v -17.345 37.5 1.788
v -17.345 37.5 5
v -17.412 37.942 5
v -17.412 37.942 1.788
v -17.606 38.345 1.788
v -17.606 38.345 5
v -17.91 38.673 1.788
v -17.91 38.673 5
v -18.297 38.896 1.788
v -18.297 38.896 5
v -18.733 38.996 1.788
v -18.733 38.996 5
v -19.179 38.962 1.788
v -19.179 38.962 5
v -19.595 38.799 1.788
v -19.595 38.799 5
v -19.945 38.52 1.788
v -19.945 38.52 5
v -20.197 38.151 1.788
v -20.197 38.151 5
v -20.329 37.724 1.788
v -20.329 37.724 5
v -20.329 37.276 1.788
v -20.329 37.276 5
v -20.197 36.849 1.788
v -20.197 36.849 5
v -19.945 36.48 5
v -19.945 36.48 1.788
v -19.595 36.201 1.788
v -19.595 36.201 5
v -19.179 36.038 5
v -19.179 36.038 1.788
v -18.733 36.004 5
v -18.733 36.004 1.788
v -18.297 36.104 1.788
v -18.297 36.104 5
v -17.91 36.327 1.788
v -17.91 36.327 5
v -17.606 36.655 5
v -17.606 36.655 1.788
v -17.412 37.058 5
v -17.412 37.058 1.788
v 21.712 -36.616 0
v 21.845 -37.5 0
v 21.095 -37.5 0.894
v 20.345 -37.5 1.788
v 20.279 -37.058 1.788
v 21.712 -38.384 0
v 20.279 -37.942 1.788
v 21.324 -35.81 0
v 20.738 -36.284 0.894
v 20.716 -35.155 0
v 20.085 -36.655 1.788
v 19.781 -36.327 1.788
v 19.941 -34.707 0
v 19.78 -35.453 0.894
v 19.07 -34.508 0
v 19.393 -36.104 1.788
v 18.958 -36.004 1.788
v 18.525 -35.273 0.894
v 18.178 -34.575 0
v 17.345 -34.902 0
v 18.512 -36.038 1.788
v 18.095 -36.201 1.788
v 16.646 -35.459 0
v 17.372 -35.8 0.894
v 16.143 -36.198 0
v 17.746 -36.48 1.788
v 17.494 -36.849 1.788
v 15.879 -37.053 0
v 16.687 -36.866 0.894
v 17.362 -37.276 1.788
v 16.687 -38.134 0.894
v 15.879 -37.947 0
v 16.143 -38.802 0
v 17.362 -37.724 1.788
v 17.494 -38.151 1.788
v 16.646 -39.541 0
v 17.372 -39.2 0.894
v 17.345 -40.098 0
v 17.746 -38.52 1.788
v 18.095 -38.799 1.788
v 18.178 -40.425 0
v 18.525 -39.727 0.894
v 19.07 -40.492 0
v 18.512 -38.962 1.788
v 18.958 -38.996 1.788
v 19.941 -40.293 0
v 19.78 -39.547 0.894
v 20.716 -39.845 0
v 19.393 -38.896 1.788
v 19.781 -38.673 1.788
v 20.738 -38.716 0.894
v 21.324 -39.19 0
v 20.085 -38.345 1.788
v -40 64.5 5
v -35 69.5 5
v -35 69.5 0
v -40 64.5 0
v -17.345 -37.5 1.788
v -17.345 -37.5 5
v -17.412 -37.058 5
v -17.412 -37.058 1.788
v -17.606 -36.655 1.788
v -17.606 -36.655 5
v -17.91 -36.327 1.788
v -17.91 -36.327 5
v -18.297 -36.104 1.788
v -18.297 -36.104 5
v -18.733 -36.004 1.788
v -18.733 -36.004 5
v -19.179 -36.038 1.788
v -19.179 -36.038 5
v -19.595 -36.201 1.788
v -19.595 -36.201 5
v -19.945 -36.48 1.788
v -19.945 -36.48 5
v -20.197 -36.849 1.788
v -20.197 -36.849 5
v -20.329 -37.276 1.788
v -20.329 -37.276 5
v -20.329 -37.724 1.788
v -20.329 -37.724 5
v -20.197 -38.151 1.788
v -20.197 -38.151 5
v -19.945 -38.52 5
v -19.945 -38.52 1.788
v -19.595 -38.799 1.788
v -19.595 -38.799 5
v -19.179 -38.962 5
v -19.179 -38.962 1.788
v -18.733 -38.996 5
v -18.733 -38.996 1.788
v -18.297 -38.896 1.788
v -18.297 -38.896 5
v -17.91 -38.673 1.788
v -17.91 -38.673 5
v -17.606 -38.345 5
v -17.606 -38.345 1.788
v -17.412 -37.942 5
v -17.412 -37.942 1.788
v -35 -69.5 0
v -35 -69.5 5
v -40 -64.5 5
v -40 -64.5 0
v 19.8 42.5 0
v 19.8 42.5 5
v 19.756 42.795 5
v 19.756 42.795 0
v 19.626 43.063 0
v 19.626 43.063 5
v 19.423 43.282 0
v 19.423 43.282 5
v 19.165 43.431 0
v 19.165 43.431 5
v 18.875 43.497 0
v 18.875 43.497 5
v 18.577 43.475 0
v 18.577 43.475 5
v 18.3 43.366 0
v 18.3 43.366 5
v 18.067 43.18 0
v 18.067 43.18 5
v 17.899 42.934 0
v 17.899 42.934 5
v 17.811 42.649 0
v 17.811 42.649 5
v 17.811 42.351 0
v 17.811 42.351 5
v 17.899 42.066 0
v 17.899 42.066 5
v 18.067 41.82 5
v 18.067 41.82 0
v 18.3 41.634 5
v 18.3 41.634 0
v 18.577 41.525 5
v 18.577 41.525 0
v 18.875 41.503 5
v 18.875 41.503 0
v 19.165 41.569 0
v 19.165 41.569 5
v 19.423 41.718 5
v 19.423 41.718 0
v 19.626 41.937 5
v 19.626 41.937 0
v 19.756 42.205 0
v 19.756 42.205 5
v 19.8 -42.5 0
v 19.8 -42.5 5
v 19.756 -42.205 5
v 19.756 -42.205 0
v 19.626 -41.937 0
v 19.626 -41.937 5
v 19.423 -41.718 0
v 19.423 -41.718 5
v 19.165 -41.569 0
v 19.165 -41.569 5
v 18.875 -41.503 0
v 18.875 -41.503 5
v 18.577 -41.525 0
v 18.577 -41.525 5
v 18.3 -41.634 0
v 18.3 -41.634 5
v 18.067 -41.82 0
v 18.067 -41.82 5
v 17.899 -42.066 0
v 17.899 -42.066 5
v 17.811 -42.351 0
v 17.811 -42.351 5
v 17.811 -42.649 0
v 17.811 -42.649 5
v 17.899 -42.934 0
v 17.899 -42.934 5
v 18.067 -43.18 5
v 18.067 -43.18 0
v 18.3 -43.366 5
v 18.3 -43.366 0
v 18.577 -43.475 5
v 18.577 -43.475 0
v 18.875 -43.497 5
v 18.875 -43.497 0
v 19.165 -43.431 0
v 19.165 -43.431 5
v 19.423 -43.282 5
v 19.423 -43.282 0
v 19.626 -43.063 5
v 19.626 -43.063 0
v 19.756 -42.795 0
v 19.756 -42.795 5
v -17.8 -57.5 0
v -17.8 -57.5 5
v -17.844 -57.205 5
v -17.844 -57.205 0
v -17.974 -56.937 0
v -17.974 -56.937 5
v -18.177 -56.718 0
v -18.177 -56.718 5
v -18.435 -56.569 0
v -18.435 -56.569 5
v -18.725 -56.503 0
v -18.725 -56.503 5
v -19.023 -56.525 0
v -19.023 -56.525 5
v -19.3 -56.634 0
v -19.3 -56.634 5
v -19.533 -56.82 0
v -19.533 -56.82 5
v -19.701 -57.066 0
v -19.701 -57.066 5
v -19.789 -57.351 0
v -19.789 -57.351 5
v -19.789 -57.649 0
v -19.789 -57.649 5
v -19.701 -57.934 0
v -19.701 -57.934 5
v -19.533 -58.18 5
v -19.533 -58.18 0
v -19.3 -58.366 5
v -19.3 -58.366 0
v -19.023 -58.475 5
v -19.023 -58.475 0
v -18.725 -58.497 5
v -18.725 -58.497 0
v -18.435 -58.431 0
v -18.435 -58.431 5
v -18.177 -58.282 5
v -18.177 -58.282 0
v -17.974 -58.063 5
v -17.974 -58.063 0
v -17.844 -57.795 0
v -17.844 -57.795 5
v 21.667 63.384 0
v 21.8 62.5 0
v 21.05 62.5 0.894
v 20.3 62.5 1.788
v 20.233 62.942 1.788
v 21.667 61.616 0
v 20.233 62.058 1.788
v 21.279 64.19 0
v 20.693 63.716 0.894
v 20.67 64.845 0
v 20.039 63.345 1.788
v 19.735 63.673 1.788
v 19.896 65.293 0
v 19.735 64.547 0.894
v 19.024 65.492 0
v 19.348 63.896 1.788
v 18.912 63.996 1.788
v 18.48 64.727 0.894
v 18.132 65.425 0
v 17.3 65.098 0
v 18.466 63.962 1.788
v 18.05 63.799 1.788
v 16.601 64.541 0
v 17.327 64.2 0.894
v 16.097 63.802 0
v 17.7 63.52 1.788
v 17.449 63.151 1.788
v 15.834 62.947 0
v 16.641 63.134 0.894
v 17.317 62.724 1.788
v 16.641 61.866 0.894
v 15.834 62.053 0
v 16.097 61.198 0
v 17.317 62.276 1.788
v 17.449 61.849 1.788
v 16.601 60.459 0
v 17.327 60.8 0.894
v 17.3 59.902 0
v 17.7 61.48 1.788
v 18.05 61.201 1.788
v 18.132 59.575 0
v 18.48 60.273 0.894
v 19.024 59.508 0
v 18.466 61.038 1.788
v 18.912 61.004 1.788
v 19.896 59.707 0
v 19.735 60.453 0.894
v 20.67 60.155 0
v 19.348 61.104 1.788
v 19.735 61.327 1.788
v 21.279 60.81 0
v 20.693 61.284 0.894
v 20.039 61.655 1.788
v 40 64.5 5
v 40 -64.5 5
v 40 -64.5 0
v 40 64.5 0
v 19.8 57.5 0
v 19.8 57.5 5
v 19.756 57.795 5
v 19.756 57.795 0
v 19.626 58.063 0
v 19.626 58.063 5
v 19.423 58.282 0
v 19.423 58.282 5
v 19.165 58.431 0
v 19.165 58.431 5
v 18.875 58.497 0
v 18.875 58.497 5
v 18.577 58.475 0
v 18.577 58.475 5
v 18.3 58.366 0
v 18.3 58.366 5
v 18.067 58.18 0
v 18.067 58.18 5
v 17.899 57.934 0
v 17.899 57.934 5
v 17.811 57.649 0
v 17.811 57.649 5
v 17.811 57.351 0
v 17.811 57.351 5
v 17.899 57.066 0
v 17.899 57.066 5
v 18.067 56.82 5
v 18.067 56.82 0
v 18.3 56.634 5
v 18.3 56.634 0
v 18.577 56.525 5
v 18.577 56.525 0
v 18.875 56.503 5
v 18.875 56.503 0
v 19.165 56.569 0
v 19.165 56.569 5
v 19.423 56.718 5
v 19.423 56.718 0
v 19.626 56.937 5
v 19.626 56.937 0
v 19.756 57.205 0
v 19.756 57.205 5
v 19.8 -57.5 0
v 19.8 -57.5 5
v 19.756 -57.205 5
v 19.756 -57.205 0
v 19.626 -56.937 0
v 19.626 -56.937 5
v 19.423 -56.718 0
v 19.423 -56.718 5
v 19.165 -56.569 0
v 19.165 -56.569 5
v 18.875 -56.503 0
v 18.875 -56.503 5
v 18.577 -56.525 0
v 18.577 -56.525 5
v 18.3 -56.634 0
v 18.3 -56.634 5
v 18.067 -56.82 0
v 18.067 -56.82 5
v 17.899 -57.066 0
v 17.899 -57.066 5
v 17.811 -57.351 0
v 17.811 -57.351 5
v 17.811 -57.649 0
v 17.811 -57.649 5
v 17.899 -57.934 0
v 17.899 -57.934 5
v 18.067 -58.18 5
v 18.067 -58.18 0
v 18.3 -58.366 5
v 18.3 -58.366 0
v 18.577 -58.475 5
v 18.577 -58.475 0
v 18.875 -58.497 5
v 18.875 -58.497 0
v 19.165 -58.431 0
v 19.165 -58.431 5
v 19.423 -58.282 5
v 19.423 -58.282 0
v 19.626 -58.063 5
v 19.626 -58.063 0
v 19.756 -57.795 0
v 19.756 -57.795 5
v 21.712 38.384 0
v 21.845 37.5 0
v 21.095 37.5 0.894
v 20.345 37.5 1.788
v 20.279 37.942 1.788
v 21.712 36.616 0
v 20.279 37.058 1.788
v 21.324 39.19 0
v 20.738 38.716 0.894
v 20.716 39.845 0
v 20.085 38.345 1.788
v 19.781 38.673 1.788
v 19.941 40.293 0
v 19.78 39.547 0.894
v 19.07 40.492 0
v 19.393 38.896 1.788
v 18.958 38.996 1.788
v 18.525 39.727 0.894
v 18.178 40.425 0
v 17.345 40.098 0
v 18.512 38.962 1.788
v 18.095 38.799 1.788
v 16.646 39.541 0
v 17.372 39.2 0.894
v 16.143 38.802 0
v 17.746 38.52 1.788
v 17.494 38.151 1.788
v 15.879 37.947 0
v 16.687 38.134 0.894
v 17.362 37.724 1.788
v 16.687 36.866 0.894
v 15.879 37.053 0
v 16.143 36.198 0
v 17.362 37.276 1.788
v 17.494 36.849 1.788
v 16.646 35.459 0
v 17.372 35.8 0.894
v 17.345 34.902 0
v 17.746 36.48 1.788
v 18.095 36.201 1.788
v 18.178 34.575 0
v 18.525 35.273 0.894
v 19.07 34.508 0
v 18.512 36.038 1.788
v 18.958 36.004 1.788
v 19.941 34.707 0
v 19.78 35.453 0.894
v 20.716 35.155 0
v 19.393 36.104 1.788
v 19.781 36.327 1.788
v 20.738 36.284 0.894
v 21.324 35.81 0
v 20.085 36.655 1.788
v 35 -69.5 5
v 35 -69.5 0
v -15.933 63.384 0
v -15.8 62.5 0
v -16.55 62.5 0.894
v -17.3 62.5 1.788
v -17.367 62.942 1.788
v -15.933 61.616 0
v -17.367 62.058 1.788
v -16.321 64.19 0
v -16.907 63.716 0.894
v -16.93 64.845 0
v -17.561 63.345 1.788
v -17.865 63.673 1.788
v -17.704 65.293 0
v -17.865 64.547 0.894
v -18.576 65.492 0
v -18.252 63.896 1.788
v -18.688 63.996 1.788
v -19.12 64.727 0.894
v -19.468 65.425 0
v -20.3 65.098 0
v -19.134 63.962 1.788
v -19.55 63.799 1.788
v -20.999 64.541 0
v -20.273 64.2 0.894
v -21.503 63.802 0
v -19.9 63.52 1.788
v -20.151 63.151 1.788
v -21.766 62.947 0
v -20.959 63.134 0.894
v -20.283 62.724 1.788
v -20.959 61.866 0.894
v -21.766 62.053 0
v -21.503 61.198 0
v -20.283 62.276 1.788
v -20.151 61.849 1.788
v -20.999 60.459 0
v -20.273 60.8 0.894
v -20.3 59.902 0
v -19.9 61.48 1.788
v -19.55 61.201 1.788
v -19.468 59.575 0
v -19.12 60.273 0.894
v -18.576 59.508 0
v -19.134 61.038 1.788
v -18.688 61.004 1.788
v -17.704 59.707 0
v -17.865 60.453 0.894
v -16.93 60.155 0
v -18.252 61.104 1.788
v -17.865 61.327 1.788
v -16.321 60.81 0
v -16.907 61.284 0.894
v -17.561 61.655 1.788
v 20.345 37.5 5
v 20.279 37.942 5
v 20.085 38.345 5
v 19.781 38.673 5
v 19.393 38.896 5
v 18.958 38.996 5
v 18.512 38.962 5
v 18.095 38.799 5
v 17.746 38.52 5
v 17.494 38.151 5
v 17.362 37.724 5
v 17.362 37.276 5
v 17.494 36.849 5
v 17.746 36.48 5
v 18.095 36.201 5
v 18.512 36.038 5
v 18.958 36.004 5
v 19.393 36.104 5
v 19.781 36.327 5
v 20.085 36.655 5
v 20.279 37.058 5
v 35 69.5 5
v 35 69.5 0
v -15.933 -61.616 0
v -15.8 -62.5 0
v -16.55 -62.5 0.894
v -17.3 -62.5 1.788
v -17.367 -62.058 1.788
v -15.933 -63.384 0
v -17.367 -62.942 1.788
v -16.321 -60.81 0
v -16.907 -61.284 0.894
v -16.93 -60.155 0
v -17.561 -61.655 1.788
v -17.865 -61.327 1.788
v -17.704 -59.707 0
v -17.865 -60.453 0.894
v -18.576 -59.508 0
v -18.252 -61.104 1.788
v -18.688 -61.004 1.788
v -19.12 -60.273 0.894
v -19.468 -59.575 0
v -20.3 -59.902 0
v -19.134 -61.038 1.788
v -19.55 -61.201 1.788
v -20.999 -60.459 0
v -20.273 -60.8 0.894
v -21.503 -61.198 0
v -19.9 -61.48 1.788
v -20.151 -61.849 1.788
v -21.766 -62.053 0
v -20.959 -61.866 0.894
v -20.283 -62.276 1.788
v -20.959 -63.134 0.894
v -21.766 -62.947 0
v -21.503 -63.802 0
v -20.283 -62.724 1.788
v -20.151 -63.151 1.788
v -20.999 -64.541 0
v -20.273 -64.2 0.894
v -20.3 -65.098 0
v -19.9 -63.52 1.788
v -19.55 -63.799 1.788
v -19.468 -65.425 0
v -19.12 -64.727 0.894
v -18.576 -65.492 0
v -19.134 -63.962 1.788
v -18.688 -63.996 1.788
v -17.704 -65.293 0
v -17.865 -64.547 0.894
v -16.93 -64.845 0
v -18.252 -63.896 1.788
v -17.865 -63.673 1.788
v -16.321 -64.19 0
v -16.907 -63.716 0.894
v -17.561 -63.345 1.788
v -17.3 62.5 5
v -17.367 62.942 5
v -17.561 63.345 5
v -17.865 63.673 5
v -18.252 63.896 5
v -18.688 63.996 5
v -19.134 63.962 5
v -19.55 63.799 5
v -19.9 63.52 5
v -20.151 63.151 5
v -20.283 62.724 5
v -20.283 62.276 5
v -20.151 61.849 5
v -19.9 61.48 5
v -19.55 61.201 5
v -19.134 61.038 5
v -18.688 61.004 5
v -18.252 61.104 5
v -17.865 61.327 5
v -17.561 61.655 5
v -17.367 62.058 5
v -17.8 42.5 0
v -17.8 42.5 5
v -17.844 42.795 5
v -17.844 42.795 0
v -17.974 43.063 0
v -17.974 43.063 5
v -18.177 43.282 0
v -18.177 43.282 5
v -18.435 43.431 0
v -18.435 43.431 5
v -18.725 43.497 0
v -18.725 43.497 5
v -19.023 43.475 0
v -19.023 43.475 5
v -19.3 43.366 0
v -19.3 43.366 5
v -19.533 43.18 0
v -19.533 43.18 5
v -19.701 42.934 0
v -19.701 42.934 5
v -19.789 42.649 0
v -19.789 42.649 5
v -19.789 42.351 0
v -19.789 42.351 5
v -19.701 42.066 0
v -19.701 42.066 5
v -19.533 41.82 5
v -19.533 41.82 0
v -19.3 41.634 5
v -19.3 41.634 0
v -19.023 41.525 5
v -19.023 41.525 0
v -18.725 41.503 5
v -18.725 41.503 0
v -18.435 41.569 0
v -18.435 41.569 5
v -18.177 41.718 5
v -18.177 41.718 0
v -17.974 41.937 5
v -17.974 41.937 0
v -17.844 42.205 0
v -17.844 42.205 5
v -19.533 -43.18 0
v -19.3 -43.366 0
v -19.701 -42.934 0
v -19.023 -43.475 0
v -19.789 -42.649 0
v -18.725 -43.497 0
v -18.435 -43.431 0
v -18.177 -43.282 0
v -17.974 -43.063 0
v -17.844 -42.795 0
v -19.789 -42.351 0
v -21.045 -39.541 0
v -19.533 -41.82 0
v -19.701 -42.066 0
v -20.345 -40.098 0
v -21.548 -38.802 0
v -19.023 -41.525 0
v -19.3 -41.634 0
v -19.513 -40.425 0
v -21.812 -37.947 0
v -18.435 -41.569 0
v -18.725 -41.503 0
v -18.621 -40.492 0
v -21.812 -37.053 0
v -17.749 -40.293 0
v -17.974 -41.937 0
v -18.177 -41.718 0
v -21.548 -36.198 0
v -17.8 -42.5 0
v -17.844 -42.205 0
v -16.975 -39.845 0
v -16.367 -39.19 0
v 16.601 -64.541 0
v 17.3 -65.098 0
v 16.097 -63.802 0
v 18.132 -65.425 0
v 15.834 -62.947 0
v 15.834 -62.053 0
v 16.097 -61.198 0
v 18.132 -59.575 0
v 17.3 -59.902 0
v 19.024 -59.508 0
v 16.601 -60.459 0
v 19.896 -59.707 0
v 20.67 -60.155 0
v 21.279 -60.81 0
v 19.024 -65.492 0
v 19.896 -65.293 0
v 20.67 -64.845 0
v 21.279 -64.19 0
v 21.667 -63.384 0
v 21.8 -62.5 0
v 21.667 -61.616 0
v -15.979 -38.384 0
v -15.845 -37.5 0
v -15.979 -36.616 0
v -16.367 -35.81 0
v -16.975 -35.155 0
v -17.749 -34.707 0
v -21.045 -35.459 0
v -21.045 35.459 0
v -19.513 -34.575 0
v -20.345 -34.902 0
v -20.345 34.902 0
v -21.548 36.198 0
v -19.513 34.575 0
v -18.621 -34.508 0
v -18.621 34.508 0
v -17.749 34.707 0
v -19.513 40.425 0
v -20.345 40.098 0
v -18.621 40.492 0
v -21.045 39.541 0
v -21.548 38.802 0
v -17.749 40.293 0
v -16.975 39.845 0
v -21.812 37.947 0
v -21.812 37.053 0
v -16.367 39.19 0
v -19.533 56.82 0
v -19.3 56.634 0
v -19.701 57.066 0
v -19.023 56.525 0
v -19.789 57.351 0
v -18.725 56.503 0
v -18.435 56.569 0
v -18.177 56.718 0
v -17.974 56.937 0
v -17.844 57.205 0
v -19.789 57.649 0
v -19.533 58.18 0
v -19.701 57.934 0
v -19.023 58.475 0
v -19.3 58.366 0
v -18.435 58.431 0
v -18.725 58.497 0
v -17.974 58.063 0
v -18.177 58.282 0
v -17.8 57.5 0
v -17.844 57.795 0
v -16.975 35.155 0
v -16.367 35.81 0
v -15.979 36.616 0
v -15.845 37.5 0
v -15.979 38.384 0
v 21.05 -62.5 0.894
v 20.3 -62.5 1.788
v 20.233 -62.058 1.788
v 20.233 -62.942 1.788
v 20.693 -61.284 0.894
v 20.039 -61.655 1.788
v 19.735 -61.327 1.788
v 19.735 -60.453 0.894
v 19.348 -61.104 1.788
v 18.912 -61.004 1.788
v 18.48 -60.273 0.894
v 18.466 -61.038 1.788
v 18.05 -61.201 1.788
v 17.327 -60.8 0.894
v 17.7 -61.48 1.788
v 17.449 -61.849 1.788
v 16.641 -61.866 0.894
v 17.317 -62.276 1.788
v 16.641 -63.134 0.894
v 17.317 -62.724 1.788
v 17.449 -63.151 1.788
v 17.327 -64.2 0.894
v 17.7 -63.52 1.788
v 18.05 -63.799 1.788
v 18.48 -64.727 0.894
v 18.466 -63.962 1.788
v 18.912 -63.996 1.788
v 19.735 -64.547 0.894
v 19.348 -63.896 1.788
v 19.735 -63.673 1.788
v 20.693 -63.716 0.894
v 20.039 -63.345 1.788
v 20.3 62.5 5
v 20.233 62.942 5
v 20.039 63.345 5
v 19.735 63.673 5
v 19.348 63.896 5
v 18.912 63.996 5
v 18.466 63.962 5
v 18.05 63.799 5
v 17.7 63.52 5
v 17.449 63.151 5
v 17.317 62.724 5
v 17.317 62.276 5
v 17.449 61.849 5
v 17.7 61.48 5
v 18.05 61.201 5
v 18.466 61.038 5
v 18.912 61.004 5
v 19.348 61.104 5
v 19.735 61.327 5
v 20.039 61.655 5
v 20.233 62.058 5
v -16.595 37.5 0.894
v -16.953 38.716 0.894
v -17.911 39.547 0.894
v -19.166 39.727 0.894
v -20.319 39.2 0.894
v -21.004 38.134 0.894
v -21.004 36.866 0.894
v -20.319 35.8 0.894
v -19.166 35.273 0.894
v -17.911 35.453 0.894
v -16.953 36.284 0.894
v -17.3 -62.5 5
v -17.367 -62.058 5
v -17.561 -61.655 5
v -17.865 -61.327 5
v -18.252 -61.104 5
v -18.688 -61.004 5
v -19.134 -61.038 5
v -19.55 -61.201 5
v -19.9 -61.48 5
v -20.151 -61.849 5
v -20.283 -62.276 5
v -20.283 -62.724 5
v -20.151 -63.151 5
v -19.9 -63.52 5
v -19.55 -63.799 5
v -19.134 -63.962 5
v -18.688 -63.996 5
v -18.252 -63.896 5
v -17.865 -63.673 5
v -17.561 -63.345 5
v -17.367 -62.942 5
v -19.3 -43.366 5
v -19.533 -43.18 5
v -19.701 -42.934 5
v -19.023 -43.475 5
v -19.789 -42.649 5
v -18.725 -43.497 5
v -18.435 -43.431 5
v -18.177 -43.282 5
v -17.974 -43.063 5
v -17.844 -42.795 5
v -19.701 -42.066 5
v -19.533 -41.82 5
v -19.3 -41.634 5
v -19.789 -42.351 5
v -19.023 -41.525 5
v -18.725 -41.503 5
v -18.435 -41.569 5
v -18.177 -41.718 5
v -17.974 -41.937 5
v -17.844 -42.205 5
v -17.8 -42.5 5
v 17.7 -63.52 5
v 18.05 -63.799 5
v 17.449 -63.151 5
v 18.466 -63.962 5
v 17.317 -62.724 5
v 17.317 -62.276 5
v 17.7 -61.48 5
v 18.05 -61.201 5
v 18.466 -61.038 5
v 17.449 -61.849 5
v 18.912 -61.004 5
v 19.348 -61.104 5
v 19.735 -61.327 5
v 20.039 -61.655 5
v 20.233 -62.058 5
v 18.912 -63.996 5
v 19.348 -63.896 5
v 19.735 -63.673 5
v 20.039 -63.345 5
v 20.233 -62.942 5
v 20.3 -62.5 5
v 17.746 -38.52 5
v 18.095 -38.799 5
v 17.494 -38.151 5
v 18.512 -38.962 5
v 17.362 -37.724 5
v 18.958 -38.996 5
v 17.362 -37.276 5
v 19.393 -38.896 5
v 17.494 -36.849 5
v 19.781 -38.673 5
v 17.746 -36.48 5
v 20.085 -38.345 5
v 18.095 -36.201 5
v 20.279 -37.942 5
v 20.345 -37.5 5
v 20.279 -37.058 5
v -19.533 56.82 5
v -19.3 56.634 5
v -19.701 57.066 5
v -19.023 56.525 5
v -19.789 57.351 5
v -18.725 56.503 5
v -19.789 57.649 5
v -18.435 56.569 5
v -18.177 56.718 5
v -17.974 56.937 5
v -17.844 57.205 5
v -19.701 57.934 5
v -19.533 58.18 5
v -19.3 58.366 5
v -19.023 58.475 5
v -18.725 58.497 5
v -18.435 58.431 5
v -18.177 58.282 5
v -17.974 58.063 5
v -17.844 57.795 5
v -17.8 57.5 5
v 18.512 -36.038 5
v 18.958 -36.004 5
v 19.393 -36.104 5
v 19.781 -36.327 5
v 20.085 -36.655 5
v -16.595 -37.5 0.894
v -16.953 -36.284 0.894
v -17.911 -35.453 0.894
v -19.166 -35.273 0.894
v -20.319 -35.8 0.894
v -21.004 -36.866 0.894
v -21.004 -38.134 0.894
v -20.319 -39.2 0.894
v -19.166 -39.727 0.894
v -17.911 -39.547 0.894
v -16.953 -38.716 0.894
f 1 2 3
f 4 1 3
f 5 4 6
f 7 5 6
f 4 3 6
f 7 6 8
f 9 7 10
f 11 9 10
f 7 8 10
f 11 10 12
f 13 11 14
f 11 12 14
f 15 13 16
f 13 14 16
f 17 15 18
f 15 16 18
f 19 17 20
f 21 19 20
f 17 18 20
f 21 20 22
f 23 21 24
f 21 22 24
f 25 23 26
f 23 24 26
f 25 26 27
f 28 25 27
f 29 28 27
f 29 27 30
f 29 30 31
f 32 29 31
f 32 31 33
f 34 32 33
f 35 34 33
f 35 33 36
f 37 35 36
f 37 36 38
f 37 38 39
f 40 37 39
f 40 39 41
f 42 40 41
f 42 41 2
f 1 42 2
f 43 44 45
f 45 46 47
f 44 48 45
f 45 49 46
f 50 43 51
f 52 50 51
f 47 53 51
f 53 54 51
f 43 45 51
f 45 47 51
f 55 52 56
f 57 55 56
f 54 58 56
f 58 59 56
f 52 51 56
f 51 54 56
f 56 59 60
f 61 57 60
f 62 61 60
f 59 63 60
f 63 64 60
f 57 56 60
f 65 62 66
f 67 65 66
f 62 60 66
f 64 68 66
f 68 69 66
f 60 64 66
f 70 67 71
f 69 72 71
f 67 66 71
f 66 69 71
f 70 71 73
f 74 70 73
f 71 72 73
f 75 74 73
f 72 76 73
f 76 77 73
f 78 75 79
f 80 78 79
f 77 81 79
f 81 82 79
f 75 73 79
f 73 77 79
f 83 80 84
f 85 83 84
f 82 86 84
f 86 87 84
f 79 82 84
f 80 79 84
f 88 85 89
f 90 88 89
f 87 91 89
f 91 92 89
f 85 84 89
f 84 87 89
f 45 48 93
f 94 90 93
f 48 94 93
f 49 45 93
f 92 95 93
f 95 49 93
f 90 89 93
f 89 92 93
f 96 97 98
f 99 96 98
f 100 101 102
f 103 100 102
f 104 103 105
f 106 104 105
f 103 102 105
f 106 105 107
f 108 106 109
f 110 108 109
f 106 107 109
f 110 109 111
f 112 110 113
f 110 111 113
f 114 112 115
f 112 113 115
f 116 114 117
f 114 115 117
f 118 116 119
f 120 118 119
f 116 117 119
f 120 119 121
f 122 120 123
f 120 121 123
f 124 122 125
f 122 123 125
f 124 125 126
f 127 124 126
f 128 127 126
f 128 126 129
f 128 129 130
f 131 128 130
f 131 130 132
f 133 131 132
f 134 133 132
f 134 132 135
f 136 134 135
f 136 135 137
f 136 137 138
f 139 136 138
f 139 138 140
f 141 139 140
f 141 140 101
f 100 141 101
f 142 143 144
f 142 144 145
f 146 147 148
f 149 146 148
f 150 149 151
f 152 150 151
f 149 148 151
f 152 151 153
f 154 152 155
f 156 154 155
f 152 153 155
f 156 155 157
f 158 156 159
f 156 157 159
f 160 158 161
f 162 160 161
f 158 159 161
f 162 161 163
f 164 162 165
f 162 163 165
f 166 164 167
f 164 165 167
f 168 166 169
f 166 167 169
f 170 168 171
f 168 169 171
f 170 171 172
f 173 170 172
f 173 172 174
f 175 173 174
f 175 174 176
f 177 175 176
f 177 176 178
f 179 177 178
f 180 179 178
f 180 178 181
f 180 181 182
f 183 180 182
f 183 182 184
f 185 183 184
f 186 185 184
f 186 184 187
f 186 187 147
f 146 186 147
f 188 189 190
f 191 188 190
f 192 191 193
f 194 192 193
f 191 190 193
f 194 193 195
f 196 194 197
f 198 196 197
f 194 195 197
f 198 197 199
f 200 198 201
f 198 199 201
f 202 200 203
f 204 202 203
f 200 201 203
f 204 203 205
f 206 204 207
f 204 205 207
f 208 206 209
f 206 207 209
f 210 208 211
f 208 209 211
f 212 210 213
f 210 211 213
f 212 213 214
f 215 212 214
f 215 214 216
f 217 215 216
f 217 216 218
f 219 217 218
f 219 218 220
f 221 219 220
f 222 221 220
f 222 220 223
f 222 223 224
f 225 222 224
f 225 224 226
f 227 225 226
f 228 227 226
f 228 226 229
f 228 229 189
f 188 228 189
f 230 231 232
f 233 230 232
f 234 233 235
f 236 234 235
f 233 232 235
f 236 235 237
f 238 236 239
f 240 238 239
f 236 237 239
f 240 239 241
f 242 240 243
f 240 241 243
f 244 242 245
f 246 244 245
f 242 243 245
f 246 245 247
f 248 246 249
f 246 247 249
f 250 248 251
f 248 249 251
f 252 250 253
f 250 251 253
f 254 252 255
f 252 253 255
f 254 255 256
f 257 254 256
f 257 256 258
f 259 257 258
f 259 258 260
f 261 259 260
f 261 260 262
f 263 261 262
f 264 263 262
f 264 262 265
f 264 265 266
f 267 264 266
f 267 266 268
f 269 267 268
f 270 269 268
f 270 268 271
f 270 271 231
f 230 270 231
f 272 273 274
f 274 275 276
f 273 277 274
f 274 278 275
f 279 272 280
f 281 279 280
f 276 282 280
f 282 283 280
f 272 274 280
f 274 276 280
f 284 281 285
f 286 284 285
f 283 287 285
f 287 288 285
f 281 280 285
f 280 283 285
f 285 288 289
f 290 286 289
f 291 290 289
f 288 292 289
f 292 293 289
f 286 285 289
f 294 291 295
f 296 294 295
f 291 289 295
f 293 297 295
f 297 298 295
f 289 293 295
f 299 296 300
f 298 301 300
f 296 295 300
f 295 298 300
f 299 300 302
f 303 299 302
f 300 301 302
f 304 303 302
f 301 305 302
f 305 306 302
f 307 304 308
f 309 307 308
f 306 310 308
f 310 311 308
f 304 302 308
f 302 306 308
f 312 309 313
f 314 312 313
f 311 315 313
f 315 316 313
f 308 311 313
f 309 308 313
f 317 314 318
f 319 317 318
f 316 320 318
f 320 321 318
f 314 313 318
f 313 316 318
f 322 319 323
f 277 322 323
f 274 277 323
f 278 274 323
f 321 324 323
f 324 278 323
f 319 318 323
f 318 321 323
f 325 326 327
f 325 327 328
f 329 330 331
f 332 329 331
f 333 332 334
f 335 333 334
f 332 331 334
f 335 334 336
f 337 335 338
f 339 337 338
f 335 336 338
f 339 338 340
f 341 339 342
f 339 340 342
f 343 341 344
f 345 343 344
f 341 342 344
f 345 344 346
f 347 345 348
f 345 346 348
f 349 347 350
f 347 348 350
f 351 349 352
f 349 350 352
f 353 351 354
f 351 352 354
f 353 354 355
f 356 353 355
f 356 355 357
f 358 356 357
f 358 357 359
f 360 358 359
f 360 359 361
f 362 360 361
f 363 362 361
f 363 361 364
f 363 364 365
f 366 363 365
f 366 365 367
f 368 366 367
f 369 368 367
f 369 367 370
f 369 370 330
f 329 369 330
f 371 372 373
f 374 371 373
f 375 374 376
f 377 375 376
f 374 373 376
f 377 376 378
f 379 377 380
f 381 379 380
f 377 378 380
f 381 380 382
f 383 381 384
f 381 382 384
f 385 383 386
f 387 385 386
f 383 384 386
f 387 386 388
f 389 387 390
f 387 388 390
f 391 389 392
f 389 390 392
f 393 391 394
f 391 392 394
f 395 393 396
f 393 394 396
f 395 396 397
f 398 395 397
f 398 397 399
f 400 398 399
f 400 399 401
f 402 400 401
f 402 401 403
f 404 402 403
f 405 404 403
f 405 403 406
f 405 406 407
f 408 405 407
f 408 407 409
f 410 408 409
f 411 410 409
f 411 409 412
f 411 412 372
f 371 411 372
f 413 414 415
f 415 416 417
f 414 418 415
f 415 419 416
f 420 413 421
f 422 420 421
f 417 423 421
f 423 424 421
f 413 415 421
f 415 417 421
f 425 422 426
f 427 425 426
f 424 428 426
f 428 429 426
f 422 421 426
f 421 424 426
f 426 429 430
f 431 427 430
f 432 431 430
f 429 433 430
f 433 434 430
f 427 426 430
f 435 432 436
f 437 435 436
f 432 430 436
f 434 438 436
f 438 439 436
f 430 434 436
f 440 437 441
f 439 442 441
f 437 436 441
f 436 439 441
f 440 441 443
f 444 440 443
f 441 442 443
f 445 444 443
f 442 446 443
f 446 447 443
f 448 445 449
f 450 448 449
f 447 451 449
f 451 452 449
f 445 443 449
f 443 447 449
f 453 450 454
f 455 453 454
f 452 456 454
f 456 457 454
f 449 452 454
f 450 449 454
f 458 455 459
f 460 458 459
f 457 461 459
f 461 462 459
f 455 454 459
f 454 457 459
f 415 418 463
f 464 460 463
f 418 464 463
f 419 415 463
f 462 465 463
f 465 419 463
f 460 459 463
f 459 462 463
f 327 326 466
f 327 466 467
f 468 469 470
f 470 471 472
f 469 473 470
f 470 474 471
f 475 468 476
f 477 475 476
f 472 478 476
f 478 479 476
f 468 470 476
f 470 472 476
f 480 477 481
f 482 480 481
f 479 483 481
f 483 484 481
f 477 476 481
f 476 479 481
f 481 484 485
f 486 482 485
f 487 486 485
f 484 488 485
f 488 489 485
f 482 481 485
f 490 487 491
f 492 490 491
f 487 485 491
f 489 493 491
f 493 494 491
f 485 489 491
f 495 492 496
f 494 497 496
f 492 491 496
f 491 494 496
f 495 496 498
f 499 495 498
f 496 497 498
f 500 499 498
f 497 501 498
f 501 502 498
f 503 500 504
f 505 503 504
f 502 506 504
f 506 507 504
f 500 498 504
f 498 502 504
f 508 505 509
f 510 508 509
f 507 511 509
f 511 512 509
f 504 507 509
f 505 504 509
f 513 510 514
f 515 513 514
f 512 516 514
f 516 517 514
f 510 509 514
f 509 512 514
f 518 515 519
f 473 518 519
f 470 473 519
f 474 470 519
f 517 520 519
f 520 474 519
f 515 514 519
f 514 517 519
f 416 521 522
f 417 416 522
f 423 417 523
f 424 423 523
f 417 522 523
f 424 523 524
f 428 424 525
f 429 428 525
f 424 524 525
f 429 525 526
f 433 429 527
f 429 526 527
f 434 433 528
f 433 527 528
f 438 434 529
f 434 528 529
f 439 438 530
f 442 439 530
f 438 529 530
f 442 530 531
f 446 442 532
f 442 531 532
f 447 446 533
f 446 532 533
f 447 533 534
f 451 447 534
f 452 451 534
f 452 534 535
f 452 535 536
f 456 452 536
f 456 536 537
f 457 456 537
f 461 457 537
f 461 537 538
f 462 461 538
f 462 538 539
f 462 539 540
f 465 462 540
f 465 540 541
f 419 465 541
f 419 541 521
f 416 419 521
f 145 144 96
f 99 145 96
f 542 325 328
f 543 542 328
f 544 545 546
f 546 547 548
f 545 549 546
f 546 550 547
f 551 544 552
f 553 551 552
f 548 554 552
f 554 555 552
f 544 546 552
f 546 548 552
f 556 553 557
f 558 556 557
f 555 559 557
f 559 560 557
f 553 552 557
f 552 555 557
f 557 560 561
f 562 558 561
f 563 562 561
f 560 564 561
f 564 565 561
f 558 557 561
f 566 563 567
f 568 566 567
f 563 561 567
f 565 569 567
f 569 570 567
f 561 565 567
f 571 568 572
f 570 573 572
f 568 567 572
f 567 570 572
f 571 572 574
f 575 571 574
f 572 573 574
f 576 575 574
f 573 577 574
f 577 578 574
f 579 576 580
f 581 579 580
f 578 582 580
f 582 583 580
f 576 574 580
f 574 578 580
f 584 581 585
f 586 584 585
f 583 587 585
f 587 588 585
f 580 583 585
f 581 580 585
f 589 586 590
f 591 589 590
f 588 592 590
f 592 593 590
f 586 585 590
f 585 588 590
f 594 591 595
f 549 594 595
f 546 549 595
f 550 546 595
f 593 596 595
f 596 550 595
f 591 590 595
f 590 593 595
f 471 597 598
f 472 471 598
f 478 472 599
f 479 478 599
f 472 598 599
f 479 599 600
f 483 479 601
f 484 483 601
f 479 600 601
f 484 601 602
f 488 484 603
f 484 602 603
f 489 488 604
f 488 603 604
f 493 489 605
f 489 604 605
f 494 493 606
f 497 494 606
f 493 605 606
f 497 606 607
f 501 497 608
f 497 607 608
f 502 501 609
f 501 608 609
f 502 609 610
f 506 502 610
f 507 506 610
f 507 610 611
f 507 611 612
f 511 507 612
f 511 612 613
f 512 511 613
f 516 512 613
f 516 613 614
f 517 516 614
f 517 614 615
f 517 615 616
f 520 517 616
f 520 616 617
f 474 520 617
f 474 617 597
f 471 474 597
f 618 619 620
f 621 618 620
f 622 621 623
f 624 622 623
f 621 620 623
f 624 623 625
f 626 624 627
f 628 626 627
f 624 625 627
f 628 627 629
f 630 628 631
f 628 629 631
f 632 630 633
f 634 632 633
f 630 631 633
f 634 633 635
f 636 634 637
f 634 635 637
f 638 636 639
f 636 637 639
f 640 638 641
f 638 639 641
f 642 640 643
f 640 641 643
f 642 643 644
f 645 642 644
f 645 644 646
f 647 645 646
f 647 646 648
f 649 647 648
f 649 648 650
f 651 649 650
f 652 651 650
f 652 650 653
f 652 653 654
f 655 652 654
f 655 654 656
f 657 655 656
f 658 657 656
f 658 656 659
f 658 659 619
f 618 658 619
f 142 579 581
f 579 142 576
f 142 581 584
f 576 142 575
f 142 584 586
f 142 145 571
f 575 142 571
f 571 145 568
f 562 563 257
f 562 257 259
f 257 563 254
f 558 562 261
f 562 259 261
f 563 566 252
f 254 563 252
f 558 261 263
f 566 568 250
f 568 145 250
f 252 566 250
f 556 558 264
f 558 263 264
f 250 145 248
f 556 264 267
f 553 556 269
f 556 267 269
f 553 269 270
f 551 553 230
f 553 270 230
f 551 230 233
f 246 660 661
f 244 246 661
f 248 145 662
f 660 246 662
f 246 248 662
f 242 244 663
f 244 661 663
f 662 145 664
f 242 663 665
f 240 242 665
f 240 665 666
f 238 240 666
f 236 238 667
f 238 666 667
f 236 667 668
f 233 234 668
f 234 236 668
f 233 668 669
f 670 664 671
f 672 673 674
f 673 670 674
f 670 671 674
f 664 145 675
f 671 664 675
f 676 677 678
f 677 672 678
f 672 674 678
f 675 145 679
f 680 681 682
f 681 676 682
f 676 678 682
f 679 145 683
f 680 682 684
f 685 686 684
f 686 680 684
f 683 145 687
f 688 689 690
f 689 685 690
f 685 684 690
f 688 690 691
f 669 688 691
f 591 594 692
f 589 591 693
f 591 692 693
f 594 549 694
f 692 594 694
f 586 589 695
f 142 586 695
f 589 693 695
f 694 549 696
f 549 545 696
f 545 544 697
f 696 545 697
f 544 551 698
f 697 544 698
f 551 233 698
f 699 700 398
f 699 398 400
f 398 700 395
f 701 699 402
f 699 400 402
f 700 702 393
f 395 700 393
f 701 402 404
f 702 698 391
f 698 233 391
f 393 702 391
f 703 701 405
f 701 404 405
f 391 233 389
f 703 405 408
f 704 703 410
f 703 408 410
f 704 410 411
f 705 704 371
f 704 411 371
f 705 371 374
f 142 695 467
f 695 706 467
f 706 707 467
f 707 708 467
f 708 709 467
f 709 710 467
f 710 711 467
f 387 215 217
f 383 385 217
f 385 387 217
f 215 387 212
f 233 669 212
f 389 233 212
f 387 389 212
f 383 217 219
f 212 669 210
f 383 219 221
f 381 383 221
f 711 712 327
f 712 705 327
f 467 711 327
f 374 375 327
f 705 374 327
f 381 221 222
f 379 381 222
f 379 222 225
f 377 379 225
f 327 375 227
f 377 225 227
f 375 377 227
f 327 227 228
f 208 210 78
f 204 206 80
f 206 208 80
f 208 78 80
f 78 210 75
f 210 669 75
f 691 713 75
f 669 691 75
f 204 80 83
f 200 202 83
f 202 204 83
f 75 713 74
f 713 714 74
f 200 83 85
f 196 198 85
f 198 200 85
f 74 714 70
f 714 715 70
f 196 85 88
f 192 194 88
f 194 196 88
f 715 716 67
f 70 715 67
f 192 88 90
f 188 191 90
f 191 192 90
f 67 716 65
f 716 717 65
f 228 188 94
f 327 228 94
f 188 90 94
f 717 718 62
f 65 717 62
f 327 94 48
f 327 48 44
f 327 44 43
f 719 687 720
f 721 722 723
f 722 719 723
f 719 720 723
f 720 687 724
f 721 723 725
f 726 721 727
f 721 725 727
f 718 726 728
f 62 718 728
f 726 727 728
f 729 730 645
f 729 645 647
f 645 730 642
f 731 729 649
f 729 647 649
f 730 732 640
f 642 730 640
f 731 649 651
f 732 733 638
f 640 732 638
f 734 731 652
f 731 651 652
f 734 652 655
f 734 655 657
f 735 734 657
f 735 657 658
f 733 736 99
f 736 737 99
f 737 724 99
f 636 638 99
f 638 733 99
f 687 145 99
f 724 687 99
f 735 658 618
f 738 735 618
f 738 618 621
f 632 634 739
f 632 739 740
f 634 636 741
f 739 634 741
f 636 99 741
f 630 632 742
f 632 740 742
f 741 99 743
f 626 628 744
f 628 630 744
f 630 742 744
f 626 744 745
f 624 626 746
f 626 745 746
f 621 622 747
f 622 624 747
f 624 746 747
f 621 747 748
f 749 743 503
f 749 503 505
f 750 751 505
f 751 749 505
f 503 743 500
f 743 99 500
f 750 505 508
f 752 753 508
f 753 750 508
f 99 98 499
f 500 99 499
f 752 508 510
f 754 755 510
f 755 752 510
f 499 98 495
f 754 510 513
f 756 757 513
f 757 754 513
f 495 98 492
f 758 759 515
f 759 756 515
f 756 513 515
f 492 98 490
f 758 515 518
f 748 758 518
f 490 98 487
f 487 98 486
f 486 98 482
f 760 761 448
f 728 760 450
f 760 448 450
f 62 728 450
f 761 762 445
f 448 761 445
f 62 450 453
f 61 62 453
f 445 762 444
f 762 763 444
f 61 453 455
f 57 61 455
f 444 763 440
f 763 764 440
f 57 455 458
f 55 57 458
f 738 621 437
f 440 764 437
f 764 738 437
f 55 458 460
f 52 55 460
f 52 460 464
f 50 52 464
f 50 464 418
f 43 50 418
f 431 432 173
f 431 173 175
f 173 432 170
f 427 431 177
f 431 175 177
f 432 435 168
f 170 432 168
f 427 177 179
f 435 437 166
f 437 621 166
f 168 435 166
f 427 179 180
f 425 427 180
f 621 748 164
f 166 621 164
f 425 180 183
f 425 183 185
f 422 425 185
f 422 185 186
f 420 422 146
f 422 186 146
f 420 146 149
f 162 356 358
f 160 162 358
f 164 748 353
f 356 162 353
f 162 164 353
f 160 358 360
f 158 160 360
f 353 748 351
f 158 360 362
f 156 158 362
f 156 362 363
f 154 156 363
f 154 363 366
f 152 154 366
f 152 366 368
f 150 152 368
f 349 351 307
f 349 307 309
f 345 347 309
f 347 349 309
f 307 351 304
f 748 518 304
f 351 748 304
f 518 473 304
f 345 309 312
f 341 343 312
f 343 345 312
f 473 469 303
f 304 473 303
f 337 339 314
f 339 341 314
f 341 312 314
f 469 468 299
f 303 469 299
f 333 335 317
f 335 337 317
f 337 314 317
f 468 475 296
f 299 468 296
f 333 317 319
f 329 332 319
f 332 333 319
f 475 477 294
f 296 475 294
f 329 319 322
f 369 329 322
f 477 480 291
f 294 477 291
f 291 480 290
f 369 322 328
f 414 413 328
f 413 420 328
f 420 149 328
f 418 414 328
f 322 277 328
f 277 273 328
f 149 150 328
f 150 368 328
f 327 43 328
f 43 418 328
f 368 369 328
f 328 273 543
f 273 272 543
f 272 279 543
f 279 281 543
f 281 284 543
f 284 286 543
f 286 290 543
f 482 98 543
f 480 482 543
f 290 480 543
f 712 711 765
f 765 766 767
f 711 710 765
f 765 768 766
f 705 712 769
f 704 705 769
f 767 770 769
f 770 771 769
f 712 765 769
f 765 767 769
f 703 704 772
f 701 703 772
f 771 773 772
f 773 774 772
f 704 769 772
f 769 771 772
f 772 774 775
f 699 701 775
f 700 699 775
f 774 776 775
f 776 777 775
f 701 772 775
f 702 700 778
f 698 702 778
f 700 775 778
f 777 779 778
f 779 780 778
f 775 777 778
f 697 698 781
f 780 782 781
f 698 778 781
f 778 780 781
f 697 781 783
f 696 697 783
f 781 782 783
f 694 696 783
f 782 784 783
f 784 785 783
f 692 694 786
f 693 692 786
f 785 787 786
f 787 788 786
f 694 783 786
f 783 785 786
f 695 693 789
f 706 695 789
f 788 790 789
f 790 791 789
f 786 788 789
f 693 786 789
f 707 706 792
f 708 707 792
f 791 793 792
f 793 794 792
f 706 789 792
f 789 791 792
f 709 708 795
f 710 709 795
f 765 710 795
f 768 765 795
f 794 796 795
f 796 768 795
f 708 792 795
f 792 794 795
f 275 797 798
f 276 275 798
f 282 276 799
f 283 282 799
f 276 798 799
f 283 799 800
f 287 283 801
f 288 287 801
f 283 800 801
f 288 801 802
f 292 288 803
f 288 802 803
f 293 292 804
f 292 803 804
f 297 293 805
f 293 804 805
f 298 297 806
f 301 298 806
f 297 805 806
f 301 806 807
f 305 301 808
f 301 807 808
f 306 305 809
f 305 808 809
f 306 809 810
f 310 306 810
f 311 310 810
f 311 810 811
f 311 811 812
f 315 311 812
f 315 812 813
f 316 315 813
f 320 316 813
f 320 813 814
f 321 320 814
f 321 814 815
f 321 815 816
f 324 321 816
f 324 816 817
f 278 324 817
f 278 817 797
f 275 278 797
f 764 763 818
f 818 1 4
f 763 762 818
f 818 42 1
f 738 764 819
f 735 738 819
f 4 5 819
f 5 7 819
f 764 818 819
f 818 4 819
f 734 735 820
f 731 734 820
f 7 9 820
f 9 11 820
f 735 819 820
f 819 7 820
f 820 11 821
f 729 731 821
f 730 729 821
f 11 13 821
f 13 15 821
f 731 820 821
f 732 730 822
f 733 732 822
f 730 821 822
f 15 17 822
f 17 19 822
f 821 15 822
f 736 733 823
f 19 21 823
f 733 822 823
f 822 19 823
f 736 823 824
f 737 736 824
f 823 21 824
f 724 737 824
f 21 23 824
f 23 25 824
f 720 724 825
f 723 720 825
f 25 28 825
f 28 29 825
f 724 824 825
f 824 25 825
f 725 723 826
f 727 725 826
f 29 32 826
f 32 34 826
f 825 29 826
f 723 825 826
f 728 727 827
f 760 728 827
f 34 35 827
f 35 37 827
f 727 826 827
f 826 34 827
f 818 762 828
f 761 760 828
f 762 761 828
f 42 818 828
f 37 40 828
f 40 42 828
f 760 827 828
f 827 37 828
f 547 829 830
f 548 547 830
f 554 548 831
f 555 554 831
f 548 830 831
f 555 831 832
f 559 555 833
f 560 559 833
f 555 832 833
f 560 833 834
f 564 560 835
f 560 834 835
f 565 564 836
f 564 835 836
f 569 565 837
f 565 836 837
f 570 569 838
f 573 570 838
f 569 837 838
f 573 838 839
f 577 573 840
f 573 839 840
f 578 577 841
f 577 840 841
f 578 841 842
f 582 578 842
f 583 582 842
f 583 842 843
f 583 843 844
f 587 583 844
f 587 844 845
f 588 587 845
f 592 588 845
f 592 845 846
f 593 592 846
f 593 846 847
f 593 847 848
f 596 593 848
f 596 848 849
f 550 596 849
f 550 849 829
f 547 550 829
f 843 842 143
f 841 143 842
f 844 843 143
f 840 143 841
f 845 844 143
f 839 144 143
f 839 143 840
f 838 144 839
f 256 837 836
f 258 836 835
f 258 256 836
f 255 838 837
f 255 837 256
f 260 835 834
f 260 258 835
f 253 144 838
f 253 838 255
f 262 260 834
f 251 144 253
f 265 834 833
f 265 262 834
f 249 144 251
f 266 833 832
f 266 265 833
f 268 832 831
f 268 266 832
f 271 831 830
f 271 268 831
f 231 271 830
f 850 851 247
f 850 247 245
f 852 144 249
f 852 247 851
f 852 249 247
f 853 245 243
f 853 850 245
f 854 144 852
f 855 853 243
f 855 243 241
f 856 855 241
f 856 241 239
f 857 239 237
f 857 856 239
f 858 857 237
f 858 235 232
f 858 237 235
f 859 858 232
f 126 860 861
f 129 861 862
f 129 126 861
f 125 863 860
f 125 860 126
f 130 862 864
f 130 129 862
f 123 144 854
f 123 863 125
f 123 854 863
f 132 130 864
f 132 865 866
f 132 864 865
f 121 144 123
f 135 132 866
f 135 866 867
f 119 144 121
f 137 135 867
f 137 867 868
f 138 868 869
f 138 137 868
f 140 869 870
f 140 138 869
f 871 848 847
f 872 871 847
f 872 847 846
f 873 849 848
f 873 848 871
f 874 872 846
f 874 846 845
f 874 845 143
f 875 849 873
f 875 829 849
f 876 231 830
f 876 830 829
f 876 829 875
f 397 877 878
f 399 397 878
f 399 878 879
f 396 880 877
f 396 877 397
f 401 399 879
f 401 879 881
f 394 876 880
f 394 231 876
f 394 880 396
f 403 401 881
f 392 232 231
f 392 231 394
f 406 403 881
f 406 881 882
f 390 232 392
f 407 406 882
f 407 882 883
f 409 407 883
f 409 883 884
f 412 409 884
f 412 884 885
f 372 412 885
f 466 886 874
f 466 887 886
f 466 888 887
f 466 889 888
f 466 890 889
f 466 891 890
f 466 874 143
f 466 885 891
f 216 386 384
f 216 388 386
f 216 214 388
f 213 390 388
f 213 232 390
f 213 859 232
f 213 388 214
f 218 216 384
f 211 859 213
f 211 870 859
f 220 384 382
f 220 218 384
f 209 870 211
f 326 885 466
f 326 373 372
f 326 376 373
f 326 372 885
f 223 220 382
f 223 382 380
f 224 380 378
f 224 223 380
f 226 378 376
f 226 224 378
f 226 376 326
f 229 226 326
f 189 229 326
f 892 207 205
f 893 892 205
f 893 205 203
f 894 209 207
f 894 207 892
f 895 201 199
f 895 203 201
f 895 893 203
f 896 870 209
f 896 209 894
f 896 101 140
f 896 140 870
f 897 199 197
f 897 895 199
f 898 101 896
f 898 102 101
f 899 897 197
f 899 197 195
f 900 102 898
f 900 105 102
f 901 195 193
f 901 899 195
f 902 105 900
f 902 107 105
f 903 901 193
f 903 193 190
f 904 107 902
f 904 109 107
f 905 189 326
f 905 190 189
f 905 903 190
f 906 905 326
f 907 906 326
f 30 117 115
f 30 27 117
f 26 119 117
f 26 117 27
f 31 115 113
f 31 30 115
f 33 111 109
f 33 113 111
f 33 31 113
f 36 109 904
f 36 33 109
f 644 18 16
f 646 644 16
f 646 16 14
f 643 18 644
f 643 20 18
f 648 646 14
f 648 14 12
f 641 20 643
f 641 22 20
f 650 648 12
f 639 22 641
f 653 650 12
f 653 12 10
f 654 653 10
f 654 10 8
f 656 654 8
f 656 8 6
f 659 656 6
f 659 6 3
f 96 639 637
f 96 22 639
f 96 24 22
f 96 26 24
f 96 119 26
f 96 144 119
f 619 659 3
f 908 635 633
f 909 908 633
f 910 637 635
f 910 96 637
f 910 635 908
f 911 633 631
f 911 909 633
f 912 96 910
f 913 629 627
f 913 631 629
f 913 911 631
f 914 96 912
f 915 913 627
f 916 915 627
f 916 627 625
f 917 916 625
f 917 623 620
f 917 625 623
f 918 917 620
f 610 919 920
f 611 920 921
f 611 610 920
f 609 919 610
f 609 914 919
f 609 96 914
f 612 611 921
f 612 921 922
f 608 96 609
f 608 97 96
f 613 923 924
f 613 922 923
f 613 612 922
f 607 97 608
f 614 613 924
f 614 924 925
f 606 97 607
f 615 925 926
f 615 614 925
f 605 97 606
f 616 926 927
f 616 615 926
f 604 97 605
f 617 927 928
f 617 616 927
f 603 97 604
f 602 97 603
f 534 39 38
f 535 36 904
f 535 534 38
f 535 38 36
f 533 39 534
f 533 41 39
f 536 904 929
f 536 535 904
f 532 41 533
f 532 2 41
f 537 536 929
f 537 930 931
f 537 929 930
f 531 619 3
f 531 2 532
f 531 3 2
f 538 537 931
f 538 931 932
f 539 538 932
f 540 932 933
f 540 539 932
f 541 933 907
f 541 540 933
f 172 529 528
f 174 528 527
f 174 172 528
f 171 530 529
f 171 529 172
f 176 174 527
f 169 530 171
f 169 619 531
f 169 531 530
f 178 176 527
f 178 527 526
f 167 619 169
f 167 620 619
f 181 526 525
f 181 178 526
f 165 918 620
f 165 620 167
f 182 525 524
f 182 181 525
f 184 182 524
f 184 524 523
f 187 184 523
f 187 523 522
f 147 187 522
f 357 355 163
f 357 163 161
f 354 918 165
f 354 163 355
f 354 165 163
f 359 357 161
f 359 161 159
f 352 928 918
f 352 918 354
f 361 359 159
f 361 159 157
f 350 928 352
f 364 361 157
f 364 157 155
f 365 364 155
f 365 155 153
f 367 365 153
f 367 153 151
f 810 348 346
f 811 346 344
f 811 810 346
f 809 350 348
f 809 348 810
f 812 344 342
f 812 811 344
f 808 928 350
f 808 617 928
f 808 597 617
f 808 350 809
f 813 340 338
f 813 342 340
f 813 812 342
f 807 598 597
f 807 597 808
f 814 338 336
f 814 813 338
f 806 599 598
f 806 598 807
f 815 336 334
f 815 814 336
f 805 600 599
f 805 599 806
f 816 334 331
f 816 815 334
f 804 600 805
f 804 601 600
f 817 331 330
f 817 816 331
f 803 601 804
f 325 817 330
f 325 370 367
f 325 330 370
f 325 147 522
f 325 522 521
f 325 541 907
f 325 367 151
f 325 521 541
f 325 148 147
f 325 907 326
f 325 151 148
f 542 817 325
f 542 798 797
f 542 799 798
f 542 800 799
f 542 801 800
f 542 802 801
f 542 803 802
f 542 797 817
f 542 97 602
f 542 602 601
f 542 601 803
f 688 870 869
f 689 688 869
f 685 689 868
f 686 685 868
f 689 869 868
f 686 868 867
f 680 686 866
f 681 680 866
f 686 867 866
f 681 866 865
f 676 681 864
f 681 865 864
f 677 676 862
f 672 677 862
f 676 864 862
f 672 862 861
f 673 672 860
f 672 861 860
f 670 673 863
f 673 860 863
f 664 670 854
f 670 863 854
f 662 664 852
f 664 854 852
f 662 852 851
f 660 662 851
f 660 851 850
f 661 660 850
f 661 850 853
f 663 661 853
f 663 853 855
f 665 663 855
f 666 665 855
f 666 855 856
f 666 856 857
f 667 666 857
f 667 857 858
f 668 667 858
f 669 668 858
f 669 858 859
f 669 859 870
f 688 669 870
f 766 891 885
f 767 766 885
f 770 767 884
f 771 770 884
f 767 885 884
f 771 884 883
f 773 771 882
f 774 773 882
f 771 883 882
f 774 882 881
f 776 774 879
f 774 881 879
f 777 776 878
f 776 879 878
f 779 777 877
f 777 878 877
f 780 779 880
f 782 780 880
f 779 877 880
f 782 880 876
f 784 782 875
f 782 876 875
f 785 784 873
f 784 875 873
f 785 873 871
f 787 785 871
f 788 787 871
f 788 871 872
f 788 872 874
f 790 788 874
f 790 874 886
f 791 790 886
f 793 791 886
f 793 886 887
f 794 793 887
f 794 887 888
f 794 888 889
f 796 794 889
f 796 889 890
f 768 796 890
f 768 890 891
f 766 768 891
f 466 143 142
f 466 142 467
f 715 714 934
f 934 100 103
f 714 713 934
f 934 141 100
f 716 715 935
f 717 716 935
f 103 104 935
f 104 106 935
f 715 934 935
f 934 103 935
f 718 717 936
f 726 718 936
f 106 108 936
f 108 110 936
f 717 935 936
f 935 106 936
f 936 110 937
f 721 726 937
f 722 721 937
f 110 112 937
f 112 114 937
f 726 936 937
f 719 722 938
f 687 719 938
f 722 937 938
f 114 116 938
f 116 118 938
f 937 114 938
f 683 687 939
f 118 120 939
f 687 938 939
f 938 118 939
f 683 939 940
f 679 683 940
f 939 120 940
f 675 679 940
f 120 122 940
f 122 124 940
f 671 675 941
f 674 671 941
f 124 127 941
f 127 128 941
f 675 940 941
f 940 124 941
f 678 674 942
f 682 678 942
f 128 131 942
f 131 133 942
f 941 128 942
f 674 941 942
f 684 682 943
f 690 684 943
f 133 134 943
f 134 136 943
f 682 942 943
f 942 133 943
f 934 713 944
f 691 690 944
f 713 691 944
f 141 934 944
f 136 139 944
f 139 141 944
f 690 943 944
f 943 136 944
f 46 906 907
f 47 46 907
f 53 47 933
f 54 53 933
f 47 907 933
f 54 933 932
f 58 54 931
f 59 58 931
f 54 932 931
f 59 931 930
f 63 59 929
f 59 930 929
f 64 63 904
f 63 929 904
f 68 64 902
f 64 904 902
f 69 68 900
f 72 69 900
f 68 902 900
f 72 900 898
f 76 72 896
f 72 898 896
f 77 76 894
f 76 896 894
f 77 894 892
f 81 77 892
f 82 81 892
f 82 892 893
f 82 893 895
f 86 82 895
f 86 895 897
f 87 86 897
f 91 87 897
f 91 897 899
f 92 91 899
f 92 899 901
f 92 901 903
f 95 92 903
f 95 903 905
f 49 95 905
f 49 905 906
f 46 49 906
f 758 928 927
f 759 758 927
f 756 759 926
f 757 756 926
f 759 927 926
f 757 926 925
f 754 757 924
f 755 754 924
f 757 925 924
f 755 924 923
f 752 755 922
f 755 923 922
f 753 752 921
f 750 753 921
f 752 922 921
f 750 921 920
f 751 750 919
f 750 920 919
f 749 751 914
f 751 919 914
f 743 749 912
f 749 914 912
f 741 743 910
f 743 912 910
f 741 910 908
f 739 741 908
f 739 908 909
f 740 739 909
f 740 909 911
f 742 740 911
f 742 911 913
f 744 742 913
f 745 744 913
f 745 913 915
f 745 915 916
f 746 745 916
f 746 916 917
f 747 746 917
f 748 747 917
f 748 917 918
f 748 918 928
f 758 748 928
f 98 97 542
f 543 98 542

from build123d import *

# Parameters (mm, degrees)
SKETCH1_W                = 80
SKETCH1_H                = 139
BOSS_EXTRUDE1_DEPTH      = 5
F_3_0_3_DIAMETER_HOLE1_D = 3
F_2_0_2_DIAMETER_HOLE1_D = 2
CHAMFER1_SIZE            = 1.5
CHAMFER1_SIZE2           = 1.787630389
CHAMFER2_SIZE            = 5


with BuildPart() as part:
    # Sketch1 → Boss-Extrude1 (new body)
    with BuildSketch(Plane.XY.offset(5)):
        Rectangle(SKETCH1_W, SKETCH1_H)
    extrude(amount=-BOSS_EXTRUDE1_DEPTH)

    # Ø3.0 (3) Diameter Hole1 (through all)
    with Locations(Plane(origin=(0, 0, 0), x_dir=(-1, 0, 0), z_dir=(0, 0, -1))):
        with Locations((-18.8, 62.5), (18.8, -62.5), (-18.84545318, -37.5), (18.84545318, -37.5), (18.8, 62.5), (-18.84545318, 37.5), (18.84545318, 37.5), (-18.8, -62.5)):
            Hole(F_3_0_3_DIAMETER_HOLE1_D / 2)

    # Ø2.0 (2) Diameter Hole1 (through all)
    with Locations(Plane(origin=(0, 0, 0), x_dir=(-1, 0, 0), z_dir=(0, 0, -1))):
        with Locations((-18.8, 42.5), (-18.8, 57.5), (18.8, 42.5), (-18.8, -57.5), (-18.8, -42.5), (18.8, -57.5), (18.8, -42.5), (18.8, 57.5)):
            Hole(F_2_0_2_DIAMETER_HOLE1_D / 2)

    # Chamfer1
    chamfer1_edges = [part.edges().sort_by_distance(p)[0] for p in [
        (17.3, -62.5, 0),
        (-20.34545318, 37.5, 0),
        (17.34545318, 37.5, 0),
        (-20.3, 62.5, 0),
        (-20.34545318, -37.5, 0),
        (17.34545318, -37.5, 0),
        (-20.3, -62.5, 0),
        (17.3, 62.5, 0),
    ]]
    chamfer1_side = [part.faces().sort_by_distance(p)[0] for p in [
        (0, 0, 0),
    ]]
    chamfer(chamfer1_edges, length=CHAMFER1_SIZE, length2=CHAMFER1_SIZE2, reference=chamfer1_side[0])

    # Chamfer2
    chamfer2_edges = [part.edges().sort_by_distance(p)[0] for p in [
        (-40, 69.5, 2.5),
        (40, 69.5, 2.5),
        (40, -69.5, 2.5),
        (-40, -69.5, 2.5),
    ]]
    chamfer(chamfer2_edges, length=CHAMFER2_SIZE)


solid = part.part
